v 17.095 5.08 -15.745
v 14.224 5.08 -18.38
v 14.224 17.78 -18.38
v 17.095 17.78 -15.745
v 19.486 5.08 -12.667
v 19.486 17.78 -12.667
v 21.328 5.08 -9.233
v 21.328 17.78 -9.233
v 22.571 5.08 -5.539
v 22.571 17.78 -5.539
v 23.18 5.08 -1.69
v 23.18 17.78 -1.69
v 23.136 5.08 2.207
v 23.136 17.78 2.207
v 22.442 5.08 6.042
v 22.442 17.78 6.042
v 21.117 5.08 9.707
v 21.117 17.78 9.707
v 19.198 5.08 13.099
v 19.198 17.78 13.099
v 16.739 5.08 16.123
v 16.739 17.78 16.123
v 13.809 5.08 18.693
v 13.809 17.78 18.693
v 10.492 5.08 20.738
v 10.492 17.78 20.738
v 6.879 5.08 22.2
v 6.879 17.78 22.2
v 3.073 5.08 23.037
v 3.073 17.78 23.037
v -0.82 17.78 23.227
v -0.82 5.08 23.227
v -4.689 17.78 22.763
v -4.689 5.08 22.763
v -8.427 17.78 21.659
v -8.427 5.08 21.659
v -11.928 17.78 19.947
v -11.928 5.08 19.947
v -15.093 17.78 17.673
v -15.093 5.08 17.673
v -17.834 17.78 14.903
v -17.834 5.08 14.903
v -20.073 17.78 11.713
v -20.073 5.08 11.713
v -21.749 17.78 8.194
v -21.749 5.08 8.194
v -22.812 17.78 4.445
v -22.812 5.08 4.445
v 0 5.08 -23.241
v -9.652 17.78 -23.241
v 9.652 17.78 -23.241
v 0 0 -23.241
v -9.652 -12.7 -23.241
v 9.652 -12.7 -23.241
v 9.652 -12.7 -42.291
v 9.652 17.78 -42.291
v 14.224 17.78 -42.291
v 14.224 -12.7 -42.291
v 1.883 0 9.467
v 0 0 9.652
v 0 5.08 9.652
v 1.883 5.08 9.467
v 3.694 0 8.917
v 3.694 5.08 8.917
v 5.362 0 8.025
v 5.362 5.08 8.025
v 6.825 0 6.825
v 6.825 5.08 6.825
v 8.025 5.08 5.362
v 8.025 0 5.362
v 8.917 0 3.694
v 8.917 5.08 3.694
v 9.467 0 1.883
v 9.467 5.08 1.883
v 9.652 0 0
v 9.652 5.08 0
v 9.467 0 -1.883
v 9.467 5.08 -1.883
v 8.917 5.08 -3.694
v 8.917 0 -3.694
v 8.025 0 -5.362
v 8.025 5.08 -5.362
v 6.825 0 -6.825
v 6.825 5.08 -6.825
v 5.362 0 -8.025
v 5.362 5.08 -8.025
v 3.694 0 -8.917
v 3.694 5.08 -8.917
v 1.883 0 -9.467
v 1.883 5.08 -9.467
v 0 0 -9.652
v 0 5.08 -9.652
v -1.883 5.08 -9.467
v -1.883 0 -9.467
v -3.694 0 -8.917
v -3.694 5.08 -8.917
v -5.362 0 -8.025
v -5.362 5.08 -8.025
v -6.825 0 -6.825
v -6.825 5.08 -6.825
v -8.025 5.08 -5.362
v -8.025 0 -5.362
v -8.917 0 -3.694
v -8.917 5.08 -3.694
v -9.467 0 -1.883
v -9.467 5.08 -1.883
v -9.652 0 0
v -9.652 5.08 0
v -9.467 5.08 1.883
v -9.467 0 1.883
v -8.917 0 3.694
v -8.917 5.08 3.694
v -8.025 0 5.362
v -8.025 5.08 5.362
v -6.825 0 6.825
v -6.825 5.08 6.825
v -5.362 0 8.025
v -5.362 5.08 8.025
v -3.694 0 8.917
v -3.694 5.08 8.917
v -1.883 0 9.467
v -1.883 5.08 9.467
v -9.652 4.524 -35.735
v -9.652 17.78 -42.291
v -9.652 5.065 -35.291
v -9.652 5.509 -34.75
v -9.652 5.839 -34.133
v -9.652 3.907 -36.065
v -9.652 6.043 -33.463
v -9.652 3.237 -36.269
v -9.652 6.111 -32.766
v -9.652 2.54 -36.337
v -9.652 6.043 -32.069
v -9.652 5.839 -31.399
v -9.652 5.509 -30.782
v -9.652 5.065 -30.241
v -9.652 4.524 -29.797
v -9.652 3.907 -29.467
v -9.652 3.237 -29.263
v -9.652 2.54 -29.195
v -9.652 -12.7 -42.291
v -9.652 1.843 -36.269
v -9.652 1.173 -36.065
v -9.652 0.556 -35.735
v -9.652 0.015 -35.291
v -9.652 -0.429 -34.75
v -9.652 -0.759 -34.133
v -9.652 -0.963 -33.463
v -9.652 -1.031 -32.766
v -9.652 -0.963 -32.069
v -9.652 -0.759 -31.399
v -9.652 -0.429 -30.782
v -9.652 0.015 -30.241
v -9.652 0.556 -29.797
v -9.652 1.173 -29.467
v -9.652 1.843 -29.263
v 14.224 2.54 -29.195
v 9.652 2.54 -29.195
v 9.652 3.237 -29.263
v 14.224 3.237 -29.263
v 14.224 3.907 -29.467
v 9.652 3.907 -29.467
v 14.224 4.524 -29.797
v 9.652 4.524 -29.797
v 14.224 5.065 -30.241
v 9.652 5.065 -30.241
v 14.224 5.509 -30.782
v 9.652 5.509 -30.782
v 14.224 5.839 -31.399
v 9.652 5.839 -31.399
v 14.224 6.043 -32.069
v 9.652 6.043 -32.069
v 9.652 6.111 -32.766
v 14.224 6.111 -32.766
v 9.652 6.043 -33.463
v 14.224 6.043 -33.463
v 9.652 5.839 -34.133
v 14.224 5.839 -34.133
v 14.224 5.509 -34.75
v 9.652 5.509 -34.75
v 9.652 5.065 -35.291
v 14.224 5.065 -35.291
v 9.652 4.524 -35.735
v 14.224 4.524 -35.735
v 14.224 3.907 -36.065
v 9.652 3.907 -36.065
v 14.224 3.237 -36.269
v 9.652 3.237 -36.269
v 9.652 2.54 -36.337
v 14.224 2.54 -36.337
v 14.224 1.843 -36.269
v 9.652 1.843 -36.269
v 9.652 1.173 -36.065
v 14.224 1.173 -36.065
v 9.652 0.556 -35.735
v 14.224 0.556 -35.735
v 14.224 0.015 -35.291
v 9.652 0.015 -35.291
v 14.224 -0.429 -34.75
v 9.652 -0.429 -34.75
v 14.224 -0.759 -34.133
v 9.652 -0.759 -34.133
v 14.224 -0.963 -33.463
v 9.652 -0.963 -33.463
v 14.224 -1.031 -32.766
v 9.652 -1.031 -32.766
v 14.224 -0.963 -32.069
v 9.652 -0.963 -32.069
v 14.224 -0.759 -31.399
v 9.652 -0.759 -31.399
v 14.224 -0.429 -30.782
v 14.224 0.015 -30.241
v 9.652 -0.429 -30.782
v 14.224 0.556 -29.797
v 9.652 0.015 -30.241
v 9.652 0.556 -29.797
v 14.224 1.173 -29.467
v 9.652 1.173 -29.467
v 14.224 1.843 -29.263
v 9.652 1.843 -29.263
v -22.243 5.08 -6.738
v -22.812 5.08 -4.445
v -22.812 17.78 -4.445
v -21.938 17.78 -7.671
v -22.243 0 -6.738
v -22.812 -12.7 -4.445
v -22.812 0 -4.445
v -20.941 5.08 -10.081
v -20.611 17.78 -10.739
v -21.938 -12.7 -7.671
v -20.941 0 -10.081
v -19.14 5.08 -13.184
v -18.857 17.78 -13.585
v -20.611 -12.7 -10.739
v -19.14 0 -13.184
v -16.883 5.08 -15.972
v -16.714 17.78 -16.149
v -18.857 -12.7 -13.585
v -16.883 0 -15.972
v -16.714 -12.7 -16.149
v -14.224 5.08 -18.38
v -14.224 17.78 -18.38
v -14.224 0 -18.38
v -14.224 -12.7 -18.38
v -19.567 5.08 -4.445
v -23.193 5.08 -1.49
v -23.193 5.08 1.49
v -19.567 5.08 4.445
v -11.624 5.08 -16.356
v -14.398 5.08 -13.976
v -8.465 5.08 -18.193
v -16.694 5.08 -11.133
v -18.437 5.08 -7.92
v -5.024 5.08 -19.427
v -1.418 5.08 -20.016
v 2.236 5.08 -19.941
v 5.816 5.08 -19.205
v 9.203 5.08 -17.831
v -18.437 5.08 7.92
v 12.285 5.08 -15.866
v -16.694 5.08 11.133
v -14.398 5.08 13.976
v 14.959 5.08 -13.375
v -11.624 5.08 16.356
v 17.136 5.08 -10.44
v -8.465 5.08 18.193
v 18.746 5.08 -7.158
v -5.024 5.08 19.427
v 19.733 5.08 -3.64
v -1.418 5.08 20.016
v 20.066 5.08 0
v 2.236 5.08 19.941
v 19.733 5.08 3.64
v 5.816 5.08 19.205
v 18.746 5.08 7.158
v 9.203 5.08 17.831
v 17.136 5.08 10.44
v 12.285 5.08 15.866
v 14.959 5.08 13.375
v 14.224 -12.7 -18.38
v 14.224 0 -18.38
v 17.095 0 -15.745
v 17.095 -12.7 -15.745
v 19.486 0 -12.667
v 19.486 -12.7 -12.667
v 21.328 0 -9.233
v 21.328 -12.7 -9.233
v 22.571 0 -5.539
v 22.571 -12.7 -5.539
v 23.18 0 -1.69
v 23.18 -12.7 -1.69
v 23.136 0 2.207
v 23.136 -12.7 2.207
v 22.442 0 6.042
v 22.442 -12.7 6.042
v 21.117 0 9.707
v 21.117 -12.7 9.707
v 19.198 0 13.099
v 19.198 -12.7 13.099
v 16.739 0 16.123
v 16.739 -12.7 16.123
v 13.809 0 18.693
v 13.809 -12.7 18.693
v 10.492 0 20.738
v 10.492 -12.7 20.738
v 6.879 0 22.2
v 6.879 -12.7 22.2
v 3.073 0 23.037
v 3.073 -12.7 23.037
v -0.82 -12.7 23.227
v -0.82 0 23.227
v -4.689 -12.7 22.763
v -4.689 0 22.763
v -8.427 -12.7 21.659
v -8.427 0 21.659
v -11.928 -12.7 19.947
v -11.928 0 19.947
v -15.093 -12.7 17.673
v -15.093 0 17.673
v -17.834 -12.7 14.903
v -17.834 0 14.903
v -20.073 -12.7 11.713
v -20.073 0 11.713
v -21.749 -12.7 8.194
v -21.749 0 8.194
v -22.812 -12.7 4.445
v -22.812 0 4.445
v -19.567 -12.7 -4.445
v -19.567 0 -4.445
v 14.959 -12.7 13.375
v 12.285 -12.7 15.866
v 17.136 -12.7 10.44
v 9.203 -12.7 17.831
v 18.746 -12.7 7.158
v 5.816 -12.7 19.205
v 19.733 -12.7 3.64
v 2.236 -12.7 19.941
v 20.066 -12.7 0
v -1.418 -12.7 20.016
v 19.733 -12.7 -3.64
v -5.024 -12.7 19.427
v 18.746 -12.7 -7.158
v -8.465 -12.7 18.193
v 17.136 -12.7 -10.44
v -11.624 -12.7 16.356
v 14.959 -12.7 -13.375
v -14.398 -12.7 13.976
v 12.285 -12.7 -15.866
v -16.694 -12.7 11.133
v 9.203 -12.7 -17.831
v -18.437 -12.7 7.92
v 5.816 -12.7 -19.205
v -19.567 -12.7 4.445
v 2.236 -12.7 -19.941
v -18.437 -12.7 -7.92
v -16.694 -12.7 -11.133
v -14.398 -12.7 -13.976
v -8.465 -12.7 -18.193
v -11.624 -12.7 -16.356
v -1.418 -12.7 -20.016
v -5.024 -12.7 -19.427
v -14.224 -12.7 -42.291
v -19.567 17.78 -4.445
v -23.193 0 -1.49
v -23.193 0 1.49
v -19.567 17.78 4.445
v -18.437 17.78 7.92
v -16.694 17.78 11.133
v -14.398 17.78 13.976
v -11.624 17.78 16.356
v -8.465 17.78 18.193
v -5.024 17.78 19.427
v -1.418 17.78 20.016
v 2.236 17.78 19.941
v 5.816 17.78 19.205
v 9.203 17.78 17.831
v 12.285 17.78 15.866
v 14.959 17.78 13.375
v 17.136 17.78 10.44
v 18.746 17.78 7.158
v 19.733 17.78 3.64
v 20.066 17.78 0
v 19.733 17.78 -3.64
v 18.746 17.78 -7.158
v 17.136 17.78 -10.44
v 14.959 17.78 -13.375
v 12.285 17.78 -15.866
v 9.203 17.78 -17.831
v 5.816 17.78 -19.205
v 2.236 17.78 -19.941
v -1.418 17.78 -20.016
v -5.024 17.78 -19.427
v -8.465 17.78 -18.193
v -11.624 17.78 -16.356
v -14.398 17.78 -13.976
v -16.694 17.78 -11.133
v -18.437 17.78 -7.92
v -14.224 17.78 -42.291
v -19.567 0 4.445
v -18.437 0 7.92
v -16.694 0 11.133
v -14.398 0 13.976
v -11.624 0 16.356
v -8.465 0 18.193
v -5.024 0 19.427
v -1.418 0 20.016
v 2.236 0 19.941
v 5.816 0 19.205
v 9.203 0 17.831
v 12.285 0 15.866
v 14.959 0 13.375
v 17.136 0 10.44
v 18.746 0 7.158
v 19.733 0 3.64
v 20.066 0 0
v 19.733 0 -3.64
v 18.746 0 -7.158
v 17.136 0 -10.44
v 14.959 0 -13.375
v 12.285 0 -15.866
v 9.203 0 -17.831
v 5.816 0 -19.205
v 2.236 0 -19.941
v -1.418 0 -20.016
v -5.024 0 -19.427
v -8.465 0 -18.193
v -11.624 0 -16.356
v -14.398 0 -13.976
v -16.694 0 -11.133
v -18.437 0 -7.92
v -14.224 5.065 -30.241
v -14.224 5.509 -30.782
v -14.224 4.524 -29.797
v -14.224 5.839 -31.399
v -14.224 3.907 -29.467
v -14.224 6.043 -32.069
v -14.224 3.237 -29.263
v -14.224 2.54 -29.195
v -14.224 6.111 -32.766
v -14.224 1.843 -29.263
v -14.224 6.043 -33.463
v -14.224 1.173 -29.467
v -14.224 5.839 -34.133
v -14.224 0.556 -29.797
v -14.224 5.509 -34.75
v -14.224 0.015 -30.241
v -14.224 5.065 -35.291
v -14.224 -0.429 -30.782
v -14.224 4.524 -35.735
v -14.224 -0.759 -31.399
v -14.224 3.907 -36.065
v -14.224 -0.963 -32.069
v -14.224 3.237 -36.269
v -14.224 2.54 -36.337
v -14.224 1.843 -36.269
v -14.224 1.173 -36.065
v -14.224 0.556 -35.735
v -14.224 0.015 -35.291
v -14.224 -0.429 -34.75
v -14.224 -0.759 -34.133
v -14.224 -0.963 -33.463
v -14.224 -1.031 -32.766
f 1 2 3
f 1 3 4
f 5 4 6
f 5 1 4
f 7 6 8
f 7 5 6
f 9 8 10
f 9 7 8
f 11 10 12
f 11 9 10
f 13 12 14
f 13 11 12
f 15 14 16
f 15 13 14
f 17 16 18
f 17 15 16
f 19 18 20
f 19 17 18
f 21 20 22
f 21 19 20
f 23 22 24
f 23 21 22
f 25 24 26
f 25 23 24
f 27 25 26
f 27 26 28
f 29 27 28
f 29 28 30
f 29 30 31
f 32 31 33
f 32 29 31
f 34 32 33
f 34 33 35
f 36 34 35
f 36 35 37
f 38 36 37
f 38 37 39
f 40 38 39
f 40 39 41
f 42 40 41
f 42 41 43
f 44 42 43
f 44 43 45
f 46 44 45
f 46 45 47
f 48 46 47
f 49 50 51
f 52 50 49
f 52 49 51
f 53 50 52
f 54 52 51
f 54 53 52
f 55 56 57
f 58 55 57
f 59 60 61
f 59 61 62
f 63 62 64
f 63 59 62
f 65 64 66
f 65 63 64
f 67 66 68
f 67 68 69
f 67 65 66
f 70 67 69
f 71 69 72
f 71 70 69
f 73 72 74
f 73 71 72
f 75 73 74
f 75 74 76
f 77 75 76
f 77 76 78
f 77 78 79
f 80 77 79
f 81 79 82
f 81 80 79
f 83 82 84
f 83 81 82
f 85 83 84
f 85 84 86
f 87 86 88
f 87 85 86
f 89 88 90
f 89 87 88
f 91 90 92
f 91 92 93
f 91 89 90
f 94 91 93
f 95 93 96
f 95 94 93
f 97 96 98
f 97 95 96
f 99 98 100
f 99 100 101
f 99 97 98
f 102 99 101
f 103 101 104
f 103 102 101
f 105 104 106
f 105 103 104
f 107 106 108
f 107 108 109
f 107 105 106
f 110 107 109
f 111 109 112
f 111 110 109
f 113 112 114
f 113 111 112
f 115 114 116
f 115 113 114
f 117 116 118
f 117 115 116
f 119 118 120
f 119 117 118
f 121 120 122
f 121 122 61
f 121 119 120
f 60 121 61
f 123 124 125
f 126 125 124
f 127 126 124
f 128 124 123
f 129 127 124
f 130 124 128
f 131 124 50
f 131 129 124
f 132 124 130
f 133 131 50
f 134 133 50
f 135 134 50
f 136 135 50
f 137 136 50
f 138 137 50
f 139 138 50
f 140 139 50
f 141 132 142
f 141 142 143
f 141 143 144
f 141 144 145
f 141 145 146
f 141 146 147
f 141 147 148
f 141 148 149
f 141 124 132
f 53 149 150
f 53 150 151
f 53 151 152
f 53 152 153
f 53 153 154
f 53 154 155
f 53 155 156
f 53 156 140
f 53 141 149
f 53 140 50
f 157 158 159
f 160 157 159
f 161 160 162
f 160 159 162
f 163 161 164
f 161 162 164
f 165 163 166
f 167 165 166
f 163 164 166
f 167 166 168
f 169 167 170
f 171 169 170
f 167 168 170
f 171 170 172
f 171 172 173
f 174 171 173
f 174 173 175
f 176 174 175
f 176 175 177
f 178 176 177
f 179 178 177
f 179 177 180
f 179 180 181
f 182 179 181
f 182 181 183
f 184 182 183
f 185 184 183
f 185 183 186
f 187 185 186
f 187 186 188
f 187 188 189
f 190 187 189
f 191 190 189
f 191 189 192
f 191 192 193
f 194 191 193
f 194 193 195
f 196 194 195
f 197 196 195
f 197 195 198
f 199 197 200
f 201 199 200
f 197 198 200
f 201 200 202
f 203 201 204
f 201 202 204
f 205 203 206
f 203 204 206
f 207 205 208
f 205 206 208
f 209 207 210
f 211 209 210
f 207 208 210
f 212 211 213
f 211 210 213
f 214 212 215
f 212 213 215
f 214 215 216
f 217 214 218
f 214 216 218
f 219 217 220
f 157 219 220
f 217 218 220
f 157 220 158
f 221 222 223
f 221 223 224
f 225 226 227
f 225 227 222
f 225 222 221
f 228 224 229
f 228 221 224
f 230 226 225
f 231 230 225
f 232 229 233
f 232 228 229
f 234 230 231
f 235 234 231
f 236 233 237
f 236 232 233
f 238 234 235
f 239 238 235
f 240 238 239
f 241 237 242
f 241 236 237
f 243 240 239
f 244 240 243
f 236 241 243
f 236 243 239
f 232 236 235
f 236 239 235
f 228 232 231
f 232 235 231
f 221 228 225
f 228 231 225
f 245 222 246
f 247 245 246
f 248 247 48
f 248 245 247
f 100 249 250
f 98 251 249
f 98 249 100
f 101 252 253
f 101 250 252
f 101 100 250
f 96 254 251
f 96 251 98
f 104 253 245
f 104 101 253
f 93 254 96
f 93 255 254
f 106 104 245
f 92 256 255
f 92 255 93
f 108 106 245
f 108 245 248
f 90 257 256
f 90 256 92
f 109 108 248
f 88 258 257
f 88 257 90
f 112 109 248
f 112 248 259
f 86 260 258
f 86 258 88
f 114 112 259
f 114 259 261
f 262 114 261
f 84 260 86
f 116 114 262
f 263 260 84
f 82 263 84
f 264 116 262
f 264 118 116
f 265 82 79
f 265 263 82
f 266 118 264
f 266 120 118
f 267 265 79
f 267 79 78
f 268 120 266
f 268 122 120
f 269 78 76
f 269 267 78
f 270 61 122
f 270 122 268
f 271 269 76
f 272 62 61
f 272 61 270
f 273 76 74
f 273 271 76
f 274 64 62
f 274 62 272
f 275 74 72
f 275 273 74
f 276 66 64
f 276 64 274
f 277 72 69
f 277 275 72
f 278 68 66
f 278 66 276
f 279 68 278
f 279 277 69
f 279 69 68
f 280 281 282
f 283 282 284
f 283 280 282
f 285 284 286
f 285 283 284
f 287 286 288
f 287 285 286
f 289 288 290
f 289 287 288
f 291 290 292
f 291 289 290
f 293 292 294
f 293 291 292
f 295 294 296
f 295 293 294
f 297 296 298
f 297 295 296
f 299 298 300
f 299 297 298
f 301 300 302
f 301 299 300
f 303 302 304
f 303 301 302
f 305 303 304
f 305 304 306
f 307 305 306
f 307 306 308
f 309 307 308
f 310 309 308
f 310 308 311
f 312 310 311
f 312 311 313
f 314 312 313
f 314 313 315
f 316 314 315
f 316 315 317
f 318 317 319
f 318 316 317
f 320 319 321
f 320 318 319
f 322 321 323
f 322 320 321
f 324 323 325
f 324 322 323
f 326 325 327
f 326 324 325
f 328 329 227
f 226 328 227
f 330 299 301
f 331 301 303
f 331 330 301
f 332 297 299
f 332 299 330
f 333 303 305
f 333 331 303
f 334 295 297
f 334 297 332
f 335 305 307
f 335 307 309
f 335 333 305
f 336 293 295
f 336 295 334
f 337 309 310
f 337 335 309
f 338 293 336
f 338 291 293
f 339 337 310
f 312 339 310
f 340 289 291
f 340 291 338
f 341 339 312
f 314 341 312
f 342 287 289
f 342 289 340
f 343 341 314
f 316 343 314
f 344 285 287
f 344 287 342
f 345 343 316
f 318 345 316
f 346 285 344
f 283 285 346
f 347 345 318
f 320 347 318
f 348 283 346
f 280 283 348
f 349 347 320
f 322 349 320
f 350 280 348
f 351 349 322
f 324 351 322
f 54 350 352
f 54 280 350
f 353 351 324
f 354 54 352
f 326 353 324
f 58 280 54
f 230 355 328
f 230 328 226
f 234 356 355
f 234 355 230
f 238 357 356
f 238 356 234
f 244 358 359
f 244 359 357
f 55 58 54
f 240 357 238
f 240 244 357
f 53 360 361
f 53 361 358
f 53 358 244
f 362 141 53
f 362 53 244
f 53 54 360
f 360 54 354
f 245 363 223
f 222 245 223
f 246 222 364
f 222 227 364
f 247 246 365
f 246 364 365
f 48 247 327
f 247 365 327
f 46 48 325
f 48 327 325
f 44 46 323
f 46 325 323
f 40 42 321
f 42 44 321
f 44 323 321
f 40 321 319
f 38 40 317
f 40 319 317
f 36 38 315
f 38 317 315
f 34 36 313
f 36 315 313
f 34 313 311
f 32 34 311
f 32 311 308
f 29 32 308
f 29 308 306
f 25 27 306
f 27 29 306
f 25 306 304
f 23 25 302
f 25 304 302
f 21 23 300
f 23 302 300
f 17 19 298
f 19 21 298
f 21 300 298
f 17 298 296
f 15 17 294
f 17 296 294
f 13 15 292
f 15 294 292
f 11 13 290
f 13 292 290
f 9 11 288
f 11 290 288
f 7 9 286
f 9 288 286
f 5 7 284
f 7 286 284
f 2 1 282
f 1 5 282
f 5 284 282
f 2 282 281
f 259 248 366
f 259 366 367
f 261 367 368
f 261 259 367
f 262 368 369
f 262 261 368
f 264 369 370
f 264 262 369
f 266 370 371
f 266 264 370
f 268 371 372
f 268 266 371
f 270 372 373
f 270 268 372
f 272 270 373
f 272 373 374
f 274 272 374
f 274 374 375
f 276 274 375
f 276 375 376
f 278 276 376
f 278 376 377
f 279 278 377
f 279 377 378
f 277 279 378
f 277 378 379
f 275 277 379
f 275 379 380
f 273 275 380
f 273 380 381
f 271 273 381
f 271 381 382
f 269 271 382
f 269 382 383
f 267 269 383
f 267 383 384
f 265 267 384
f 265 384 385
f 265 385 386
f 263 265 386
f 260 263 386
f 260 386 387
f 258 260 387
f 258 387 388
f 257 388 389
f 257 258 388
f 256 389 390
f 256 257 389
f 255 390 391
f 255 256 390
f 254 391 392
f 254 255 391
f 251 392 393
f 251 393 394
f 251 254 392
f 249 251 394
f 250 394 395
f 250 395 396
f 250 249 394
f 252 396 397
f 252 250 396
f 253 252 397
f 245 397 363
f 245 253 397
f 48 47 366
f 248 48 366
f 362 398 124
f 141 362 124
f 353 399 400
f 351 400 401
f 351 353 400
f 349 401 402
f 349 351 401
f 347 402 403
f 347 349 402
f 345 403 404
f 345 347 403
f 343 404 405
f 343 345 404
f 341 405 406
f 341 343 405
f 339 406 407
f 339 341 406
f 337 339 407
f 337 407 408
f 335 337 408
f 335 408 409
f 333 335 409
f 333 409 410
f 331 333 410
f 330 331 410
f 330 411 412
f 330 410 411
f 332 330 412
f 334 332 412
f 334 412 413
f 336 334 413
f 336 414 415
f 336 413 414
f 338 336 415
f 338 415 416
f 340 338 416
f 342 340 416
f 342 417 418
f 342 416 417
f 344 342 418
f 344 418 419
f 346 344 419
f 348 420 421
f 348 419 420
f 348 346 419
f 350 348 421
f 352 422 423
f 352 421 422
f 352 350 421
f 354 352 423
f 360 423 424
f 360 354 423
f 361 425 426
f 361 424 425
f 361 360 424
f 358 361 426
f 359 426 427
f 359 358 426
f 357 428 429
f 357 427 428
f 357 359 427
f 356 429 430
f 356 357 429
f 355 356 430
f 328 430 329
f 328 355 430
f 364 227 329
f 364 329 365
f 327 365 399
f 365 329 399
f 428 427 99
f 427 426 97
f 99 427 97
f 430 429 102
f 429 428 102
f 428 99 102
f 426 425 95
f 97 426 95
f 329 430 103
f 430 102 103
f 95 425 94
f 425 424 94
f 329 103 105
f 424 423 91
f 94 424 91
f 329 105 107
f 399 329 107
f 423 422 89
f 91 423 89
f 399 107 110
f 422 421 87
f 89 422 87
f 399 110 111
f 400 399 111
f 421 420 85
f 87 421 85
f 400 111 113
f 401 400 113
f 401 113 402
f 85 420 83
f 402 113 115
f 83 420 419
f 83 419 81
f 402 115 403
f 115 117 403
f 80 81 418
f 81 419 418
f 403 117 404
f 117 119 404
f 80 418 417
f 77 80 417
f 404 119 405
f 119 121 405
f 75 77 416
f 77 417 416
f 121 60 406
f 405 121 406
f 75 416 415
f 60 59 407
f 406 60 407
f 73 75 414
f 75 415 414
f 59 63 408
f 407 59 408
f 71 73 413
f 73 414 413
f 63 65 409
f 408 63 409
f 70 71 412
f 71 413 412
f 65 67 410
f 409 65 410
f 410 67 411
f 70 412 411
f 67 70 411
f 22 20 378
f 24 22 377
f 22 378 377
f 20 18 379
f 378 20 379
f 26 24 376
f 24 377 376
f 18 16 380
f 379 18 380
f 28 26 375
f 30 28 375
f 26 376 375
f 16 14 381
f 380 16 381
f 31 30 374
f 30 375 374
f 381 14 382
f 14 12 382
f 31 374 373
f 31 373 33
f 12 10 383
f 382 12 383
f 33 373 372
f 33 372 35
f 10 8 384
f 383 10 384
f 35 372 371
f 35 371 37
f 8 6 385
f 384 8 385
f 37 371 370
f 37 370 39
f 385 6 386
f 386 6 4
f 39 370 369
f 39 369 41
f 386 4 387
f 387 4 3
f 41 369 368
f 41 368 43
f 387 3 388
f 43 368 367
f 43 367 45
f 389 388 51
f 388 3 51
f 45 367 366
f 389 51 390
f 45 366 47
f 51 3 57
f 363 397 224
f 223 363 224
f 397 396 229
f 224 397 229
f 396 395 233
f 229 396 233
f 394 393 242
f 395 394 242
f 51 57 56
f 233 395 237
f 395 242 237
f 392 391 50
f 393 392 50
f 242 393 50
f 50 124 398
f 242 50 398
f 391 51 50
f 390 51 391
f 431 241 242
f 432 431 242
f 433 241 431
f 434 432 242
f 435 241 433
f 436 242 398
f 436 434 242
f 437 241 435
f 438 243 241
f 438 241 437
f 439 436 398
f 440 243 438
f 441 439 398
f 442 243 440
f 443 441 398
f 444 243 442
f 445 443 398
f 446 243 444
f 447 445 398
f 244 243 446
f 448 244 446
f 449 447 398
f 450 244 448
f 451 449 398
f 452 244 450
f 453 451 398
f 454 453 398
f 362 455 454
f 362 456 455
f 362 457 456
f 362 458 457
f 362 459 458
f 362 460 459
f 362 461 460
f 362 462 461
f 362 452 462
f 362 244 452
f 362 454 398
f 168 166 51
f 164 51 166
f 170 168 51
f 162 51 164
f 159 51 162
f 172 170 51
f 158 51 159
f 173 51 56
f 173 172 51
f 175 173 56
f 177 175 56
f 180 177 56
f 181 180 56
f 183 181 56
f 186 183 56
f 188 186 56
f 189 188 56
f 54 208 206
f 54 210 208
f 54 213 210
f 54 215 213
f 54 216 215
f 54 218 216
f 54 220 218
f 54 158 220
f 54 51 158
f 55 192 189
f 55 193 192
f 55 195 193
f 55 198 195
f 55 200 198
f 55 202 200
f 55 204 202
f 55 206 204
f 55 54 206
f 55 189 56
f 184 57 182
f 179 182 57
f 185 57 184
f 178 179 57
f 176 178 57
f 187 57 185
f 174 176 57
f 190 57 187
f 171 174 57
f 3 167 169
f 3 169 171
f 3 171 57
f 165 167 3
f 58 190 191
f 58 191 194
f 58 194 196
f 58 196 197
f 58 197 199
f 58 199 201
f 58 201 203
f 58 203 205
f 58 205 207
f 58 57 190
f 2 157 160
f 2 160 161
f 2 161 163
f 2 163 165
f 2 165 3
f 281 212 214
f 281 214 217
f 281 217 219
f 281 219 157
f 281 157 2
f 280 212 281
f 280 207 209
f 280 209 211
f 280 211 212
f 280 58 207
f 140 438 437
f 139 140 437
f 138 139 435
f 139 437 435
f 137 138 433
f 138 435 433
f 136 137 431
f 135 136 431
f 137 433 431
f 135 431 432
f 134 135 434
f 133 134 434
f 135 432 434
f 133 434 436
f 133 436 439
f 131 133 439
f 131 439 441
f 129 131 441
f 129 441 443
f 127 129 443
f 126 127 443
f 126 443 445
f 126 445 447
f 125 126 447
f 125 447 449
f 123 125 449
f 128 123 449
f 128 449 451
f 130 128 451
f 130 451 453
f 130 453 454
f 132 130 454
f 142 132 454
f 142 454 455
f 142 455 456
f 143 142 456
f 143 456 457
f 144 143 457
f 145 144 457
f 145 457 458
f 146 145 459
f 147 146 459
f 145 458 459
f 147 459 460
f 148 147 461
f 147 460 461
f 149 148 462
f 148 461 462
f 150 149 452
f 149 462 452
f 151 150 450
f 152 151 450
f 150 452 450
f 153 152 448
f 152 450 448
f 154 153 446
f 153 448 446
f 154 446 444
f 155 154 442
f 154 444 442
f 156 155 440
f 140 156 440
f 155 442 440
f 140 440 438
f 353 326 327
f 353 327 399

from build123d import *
from build123d.topology import SkipClean

# Parameters (mm, degrees)
SKETCH1_R                = 23.241
SKETCH1_R_2              = 9.652
BOSS_EXTRUDE1_DEPTH      = 5.08
BOSS_EXTRUDE2_DEPTH      = 12.7
BOSS_EXTRUDE2_DEPTH_BACK = 17.78
F_1_4_CLEARANCE_HOLE1_D  = 7.14248


with BuildPart() as part:
    # Sketch1 → Boss-Extrude1 (new body)
    with BuildSketch(Plane(origin=(0, 0, 0), x_dir=(1, 0, 0), z_dir=(0, 1, 0))):
        with Locations(Location((0, 0, 0), (0, 0, 270))):
            Circle(SKETCH1_R)
        with Locations(Location((0, 0, 0), (0, 0, 270))):
            Circle(SKETCH1_R_2, mode=Mode.SUBTRACT)
    extrude(amount=BOSS_EXTRUDE1_DEPTH)

    # Sketch2 → Boss-Extrude2 (add, two sides: drawn at the far end of the back side and taken through both)
    with SkipClean():  # the faces are left unmerged after this step: merging them gives an invalid solid
        with BuildSketch(Plane(origin=(0, 5.08, 0), x_dir=(1, 0, 0), z_dir=(0, 1, 0)).offset(-BOSS_EXTRUDE2_DEPTH_BACK)):
            with BuildLine():
                Line((-14.224, 18.379932), (-14.224, 42.291))
                Line((-14.224, 42.291), (-9.652, 42.291))
                Line((-9.652, 42.291), (-9.652, 23.241))
                Line((-9.652, 23.241), (9.652, 23.241))
                Line((9.652, 23.241), (9.652, 42.291))
                Line((9.652, 42.291), (14.224, 42.291))
                Line((14.224, 42.291), (14.224, 18.379932))
                ThreePointArc((14.224, 18.379932), (12.193551, -19.785383), (-22.811972, -4.445))
                Line((-22.811972, -4.445), (-19.567481, -4.445))
                ThreePointArc((-19.567481, -4.445), (20.066, 0), (-19.567481, 4.445))
                Line((-19.567481, 4.445), (-22.811972, 4.445))
                ThreePointArc((-22.811972, 4.445), (-19.785383, 12.193551), (-14.224, 18.379932))
            make_face()
        extrude(amount=BOSS_EXTRUDE2_DEPTH + BOSS_EXTRUDE2_DEPTH_BACK)

    # 1/4 Clearance Hole1 (through all)
    with Locations(Plane(origin=(14.224, 0, 0), x_dir=(0, 0, -1), z_dir=(1, 0, 0))):
        with Locations((32.766, 2.54)):
            Hole(F_1_4_CLEARANCE_HOLE1_D / 2)


solid = part.part
